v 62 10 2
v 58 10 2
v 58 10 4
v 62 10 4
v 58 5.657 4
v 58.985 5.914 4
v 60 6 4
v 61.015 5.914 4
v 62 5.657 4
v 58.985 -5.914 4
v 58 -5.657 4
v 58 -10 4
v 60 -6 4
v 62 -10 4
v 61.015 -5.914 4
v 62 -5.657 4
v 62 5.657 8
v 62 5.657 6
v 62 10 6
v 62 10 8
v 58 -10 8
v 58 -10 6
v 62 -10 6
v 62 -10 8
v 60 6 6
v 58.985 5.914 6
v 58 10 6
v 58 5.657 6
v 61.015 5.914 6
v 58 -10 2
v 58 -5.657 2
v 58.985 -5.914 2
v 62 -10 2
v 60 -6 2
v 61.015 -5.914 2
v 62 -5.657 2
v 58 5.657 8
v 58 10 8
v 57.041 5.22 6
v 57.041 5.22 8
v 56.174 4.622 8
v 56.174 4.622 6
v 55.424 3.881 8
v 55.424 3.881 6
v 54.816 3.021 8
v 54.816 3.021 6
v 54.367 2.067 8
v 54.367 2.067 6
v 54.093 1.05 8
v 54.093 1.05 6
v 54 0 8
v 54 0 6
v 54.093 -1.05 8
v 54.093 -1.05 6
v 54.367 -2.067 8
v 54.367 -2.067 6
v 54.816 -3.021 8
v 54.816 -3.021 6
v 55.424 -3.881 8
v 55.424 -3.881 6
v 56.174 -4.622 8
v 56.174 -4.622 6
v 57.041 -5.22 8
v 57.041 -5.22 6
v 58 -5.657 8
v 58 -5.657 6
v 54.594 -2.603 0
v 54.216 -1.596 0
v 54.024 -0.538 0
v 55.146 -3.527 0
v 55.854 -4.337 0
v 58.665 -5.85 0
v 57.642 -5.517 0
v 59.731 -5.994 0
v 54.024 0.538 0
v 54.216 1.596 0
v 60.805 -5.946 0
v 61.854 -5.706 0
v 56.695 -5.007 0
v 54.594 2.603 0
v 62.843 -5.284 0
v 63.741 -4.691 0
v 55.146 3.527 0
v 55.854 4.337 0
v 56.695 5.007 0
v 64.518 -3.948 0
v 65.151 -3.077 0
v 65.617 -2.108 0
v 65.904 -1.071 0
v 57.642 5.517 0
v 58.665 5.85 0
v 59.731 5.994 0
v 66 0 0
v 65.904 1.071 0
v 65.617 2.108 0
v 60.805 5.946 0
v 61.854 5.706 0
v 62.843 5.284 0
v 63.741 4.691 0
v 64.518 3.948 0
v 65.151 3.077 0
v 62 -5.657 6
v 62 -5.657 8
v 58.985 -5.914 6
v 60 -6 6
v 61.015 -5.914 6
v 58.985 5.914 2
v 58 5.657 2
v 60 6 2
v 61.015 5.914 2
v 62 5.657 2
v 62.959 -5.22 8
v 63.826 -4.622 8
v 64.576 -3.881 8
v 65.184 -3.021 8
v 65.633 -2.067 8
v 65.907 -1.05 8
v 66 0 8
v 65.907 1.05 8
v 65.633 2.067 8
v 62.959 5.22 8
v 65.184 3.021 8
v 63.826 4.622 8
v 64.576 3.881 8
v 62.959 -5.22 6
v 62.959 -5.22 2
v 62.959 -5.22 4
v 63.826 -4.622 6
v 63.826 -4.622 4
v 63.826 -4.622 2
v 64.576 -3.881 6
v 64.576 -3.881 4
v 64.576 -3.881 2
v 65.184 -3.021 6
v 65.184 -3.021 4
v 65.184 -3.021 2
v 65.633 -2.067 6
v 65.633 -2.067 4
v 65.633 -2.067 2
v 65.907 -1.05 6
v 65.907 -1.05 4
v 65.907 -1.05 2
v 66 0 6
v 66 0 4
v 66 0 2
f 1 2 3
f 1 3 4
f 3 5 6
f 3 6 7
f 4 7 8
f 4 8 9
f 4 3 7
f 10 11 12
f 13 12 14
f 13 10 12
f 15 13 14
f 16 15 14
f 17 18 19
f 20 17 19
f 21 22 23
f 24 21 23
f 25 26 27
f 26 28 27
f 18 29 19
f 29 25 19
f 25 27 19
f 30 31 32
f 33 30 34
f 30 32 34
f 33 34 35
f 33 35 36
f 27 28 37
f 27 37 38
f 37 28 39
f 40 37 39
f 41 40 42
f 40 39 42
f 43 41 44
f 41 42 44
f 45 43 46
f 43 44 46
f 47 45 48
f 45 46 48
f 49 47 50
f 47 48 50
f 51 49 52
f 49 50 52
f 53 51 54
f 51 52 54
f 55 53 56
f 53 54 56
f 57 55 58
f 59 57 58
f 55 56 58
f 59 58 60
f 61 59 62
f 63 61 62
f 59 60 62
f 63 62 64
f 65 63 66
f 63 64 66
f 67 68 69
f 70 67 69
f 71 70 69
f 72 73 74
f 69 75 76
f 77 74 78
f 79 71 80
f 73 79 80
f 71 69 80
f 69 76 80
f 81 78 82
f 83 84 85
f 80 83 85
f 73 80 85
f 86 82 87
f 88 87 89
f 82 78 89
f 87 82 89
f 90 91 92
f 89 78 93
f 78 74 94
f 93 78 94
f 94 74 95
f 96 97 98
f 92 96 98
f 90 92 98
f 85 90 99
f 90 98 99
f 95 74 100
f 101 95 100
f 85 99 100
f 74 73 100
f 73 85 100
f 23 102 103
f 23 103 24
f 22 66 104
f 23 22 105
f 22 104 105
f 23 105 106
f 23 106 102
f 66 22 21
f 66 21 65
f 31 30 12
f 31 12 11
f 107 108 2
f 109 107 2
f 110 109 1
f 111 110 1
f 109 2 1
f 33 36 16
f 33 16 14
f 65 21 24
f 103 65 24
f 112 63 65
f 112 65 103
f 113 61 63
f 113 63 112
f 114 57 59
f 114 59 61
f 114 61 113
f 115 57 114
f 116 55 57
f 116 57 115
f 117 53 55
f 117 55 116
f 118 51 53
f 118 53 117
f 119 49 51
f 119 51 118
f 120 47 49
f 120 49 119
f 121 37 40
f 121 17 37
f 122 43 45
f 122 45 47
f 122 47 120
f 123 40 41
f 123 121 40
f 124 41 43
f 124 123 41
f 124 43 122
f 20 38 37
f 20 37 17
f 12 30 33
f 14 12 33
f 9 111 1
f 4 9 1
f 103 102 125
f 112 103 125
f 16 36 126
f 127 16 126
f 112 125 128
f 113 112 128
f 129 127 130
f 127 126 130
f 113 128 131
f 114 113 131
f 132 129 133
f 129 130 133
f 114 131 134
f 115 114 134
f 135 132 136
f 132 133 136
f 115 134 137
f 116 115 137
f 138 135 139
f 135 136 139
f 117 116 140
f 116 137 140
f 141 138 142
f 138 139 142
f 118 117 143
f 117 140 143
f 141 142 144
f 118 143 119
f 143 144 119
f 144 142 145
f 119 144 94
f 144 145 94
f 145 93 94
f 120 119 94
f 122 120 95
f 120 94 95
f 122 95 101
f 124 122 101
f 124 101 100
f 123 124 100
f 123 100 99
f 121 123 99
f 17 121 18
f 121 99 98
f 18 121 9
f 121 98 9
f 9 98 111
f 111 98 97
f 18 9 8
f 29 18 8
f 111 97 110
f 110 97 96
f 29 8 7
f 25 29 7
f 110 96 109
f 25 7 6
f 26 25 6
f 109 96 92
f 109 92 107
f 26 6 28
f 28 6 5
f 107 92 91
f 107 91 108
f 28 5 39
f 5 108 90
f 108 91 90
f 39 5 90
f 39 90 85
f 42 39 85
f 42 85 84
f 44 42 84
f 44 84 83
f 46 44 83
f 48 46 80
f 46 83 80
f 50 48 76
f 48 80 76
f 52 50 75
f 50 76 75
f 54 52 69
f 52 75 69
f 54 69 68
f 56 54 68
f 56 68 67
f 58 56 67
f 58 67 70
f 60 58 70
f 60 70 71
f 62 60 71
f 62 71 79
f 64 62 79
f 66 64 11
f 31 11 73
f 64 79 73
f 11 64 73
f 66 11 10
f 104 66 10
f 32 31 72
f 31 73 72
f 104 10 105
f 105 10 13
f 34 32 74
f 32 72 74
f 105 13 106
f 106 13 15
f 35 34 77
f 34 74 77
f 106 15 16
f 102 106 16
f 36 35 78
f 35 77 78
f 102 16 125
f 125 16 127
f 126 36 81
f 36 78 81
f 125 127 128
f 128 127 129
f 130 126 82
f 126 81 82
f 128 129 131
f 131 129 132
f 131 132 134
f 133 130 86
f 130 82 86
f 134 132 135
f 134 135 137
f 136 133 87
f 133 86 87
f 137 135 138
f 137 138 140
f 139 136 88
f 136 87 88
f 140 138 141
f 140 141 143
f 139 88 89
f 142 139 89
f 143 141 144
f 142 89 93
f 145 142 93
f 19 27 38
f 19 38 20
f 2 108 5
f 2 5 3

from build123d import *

# Parameters (mm, degrees)
SKETCH006_R      = 6
EXTRUDE006_DEPTH = 6
EXTRUDE007_DEPTH = 2
ARRAY001_Z_COUNT = 2
ARRAY001_Z_PITCH = 4


with BuildPart() as eixo2:
    # Sketch006 → Extrude006 (new body)
    with BuildSketch(Plane.XY):
        with Locations((60, 0)):
            Circle(SKETCH006_R)
    extrude(amount=EXTRUDE006_DEPTH)


with BuildPart() as eixo_menor:
    # Sketch007 (on Face8 of Extrude002) → Extrude007 (new body)
    with BuildSketch(Plane.XY.offset(2)):
        with BuildLine():
            ThreePointArc((62, -5.6568542495), (66, 0), (62, 5.6568542495))
            Line((62, 5.6568542495), (62, 10))
            Line((58, 10), (62, 10))
            Line((58, 5.6568542495), (58, 10))
            ThreePointArc((58, 5.6568542495), (54, 0), (58, -5.6568542495))
            Line((58, -10), (58, -5.6568542495))
            Line((58, -10), (62, -10))
            Line((62, -5.6568542495), (62, -10))
        make_face()
    extrude(amount=EXTRUDE007_DEPTH)

    # Array001 Z: Eixo Menor ×2


with BuildPart() as eixo_menor_1:
    add(eixo_menor.part)
    with Locations(*[(0, 0, i * ARRAY001_Z_PITCH) for i in range(1, ARRAY001_Z_COUNT)]):
        add(eixo_menor.part)

    # Fusion: union Eixo2
    add(eixo2.part)


solid = eixo_menor_1.part
